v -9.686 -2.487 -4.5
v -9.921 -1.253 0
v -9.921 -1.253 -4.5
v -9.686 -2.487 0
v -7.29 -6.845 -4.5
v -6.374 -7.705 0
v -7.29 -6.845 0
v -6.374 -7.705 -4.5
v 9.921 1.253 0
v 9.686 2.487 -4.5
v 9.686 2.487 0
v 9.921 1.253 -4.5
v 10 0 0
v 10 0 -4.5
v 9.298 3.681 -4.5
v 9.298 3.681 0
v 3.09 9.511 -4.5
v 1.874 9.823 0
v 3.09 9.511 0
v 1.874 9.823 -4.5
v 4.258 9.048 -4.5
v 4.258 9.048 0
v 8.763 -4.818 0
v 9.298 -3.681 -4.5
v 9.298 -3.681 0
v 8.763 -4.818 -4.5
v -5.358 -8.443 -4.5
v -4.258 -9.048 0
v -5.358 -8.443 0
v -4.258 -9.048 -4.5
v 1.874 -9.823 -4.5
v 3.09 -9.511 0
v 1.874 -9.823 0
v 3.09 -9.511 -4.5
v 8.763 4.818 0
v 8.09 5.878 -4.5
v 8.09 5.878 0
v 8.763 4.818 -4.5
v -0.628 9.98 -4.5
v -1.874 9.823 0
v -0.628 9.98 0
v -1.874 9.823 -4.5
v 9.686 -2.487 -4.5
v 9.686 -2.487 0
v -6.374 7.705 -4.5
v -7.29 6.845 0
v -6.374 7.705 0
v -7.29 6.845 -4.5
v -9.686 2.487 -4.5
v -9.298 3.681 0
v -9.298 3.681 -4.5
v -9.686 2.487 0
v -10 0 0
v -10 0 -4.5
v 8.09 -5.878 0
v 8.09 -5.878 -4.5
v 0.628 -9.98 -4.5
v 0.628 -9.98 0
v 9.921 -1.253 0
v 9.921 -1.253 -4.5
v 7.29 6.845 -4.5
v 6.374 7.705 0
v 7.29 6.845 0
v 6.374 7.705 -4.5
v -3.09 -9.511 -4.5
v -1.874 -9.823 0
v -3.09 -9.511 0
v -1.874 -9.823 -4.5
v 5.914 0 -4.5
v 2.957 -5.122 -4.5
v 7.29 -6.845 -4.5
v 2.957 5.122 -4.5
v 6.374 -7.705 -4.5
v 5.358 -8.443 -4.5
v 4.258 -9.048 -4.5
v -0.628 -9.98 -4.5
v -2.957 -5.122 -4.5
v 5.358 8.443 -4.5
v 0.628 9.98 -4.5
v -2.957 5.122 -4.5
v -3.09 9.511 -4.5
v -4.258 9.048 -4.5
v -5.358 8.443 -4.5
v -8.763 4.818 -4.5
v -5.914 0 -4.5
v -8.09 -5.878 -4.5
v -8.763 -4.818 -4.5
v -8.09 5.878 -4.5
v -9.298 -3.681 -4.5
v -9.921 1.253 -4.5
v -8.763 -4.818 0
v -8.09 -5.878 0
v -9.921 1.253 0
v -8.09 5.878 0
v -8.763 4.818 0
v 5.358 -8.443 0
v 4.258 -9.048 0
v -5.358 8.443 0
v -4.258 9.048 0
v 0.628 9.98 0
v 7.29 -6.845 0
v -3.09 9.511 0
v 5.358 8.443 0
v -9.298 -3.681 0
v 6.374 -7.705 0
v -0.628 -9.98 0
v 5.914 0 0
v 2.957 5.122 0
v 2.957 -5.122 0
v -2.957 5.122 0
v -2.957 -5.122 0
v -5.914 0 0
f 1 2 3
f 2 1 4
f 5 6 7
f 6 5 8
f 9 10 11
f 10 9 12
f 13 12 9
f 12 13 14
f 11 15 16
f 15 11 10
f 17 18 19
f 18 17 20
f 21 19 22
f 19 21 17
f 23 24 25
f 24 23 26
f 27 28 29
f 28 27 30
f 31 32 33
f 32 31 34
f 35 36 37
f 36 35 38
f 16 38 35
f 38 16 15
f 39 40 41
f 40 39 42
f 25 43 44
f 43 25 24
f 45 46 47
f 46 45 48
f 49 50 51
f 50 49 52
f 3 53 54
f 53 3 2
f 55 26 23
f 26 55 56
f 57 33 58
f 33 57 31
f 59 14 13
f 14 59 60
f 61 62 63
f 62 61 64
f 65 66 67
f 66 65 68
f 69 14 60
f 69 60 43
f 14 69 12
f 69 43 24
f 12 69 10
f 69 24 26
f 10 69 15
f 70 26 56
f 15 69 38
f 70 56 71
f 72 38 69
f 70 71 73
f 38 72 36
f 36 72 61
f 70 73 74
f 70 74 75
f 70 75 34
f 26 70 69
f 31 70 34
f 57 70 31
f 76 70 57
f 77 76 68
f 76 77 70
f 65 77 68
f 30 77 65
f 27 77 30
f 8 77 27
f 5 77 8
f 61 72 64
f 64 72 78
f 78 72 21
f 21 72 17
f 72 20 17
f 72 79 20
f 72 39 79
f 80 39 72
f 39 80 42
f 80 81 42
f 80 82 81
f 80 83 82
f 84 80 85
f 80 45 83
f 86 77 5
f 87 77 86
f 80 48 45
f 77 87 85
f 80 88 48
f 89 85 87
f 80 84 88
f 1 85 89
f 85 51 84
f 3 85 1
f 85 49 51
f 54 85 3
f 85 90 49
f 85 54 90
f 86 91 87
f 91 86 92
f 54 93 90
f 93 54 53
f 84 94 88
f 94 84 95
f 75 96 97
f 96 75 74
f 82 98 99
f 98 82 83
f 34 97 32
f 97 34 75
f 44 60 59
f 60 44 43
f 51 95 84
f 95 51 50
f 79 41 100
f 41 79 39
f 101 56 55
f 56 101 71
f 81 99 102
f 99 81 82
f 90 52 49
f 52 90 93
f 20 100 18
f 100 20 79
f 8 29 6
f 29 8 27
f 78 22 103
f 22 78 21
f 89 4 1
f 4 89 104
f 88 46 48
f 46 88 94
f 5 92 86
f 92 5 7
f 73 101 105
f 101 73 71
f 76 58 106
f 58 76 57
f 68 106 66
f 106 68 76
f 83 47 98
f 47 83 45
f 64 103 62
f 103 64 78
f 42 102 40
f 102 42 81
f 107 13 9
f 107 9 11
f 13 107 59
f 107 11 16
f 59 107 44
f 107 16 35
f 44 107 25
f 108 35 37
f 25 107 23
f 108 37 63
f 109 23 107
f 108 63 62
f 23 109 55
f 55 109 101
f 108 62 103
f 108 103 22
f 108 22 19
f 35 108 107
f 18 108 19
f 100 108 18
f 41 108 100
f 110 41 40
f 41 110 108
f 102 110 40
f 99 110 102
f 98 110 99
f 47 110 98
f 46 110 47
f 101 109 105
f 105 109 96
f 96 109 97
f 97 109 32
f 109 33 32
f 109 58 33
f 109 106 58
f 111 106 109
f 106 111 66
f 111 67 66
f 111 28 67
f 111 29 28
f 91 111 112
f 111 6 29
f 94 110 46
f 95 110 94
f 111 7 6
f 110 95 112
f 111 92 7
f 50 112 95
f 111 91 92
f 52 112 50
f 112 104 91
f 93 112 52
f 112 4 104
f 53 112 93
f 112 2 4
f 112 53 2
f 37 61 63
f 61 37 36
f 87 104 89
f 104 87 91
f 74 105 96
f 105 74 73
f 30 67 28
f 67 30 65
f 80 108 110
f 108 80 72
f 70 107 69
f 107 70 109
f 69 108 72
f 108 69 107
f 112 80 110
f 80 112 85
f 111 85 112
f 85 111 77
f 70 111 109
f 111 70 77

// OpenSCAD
$fn = 50;


difference() {
	union() {
		translate(v = [0, 0, -4.5000000000]) {
			cylinder(h = 4.5000000000, r = 10.0000000000);
		}
		#translate(v = [0, 0, -6.0000000000]) {
			cylinder(h = 6, r = 2.8750000000);
		}
	}
	union() {
		translate(v = [0, 0, 0]) {
			rotate(a = [0, 0, 0]) {
				difference() {
					union() {
						translate(v = [0, 0, -5]) {
							linear_extrude(height = 5) {
								polygon(points = [[5.9142500000, 0.0000000000], [2.9571250000, 5.1218907443], [-2.9571250000, 5.1218907443], [-5.9142500000, 0.0000000000], [-2.9571250000, -5.1218907443], [2.9571250000, -5.1218907443]]);
							}
						}
					}
					union();
				}
			}
		}
		#translate(v = [0, 0, -100.0000000000]) {
			cylinder(h = 200, r = 3.2500000000);
		}
	}
}
